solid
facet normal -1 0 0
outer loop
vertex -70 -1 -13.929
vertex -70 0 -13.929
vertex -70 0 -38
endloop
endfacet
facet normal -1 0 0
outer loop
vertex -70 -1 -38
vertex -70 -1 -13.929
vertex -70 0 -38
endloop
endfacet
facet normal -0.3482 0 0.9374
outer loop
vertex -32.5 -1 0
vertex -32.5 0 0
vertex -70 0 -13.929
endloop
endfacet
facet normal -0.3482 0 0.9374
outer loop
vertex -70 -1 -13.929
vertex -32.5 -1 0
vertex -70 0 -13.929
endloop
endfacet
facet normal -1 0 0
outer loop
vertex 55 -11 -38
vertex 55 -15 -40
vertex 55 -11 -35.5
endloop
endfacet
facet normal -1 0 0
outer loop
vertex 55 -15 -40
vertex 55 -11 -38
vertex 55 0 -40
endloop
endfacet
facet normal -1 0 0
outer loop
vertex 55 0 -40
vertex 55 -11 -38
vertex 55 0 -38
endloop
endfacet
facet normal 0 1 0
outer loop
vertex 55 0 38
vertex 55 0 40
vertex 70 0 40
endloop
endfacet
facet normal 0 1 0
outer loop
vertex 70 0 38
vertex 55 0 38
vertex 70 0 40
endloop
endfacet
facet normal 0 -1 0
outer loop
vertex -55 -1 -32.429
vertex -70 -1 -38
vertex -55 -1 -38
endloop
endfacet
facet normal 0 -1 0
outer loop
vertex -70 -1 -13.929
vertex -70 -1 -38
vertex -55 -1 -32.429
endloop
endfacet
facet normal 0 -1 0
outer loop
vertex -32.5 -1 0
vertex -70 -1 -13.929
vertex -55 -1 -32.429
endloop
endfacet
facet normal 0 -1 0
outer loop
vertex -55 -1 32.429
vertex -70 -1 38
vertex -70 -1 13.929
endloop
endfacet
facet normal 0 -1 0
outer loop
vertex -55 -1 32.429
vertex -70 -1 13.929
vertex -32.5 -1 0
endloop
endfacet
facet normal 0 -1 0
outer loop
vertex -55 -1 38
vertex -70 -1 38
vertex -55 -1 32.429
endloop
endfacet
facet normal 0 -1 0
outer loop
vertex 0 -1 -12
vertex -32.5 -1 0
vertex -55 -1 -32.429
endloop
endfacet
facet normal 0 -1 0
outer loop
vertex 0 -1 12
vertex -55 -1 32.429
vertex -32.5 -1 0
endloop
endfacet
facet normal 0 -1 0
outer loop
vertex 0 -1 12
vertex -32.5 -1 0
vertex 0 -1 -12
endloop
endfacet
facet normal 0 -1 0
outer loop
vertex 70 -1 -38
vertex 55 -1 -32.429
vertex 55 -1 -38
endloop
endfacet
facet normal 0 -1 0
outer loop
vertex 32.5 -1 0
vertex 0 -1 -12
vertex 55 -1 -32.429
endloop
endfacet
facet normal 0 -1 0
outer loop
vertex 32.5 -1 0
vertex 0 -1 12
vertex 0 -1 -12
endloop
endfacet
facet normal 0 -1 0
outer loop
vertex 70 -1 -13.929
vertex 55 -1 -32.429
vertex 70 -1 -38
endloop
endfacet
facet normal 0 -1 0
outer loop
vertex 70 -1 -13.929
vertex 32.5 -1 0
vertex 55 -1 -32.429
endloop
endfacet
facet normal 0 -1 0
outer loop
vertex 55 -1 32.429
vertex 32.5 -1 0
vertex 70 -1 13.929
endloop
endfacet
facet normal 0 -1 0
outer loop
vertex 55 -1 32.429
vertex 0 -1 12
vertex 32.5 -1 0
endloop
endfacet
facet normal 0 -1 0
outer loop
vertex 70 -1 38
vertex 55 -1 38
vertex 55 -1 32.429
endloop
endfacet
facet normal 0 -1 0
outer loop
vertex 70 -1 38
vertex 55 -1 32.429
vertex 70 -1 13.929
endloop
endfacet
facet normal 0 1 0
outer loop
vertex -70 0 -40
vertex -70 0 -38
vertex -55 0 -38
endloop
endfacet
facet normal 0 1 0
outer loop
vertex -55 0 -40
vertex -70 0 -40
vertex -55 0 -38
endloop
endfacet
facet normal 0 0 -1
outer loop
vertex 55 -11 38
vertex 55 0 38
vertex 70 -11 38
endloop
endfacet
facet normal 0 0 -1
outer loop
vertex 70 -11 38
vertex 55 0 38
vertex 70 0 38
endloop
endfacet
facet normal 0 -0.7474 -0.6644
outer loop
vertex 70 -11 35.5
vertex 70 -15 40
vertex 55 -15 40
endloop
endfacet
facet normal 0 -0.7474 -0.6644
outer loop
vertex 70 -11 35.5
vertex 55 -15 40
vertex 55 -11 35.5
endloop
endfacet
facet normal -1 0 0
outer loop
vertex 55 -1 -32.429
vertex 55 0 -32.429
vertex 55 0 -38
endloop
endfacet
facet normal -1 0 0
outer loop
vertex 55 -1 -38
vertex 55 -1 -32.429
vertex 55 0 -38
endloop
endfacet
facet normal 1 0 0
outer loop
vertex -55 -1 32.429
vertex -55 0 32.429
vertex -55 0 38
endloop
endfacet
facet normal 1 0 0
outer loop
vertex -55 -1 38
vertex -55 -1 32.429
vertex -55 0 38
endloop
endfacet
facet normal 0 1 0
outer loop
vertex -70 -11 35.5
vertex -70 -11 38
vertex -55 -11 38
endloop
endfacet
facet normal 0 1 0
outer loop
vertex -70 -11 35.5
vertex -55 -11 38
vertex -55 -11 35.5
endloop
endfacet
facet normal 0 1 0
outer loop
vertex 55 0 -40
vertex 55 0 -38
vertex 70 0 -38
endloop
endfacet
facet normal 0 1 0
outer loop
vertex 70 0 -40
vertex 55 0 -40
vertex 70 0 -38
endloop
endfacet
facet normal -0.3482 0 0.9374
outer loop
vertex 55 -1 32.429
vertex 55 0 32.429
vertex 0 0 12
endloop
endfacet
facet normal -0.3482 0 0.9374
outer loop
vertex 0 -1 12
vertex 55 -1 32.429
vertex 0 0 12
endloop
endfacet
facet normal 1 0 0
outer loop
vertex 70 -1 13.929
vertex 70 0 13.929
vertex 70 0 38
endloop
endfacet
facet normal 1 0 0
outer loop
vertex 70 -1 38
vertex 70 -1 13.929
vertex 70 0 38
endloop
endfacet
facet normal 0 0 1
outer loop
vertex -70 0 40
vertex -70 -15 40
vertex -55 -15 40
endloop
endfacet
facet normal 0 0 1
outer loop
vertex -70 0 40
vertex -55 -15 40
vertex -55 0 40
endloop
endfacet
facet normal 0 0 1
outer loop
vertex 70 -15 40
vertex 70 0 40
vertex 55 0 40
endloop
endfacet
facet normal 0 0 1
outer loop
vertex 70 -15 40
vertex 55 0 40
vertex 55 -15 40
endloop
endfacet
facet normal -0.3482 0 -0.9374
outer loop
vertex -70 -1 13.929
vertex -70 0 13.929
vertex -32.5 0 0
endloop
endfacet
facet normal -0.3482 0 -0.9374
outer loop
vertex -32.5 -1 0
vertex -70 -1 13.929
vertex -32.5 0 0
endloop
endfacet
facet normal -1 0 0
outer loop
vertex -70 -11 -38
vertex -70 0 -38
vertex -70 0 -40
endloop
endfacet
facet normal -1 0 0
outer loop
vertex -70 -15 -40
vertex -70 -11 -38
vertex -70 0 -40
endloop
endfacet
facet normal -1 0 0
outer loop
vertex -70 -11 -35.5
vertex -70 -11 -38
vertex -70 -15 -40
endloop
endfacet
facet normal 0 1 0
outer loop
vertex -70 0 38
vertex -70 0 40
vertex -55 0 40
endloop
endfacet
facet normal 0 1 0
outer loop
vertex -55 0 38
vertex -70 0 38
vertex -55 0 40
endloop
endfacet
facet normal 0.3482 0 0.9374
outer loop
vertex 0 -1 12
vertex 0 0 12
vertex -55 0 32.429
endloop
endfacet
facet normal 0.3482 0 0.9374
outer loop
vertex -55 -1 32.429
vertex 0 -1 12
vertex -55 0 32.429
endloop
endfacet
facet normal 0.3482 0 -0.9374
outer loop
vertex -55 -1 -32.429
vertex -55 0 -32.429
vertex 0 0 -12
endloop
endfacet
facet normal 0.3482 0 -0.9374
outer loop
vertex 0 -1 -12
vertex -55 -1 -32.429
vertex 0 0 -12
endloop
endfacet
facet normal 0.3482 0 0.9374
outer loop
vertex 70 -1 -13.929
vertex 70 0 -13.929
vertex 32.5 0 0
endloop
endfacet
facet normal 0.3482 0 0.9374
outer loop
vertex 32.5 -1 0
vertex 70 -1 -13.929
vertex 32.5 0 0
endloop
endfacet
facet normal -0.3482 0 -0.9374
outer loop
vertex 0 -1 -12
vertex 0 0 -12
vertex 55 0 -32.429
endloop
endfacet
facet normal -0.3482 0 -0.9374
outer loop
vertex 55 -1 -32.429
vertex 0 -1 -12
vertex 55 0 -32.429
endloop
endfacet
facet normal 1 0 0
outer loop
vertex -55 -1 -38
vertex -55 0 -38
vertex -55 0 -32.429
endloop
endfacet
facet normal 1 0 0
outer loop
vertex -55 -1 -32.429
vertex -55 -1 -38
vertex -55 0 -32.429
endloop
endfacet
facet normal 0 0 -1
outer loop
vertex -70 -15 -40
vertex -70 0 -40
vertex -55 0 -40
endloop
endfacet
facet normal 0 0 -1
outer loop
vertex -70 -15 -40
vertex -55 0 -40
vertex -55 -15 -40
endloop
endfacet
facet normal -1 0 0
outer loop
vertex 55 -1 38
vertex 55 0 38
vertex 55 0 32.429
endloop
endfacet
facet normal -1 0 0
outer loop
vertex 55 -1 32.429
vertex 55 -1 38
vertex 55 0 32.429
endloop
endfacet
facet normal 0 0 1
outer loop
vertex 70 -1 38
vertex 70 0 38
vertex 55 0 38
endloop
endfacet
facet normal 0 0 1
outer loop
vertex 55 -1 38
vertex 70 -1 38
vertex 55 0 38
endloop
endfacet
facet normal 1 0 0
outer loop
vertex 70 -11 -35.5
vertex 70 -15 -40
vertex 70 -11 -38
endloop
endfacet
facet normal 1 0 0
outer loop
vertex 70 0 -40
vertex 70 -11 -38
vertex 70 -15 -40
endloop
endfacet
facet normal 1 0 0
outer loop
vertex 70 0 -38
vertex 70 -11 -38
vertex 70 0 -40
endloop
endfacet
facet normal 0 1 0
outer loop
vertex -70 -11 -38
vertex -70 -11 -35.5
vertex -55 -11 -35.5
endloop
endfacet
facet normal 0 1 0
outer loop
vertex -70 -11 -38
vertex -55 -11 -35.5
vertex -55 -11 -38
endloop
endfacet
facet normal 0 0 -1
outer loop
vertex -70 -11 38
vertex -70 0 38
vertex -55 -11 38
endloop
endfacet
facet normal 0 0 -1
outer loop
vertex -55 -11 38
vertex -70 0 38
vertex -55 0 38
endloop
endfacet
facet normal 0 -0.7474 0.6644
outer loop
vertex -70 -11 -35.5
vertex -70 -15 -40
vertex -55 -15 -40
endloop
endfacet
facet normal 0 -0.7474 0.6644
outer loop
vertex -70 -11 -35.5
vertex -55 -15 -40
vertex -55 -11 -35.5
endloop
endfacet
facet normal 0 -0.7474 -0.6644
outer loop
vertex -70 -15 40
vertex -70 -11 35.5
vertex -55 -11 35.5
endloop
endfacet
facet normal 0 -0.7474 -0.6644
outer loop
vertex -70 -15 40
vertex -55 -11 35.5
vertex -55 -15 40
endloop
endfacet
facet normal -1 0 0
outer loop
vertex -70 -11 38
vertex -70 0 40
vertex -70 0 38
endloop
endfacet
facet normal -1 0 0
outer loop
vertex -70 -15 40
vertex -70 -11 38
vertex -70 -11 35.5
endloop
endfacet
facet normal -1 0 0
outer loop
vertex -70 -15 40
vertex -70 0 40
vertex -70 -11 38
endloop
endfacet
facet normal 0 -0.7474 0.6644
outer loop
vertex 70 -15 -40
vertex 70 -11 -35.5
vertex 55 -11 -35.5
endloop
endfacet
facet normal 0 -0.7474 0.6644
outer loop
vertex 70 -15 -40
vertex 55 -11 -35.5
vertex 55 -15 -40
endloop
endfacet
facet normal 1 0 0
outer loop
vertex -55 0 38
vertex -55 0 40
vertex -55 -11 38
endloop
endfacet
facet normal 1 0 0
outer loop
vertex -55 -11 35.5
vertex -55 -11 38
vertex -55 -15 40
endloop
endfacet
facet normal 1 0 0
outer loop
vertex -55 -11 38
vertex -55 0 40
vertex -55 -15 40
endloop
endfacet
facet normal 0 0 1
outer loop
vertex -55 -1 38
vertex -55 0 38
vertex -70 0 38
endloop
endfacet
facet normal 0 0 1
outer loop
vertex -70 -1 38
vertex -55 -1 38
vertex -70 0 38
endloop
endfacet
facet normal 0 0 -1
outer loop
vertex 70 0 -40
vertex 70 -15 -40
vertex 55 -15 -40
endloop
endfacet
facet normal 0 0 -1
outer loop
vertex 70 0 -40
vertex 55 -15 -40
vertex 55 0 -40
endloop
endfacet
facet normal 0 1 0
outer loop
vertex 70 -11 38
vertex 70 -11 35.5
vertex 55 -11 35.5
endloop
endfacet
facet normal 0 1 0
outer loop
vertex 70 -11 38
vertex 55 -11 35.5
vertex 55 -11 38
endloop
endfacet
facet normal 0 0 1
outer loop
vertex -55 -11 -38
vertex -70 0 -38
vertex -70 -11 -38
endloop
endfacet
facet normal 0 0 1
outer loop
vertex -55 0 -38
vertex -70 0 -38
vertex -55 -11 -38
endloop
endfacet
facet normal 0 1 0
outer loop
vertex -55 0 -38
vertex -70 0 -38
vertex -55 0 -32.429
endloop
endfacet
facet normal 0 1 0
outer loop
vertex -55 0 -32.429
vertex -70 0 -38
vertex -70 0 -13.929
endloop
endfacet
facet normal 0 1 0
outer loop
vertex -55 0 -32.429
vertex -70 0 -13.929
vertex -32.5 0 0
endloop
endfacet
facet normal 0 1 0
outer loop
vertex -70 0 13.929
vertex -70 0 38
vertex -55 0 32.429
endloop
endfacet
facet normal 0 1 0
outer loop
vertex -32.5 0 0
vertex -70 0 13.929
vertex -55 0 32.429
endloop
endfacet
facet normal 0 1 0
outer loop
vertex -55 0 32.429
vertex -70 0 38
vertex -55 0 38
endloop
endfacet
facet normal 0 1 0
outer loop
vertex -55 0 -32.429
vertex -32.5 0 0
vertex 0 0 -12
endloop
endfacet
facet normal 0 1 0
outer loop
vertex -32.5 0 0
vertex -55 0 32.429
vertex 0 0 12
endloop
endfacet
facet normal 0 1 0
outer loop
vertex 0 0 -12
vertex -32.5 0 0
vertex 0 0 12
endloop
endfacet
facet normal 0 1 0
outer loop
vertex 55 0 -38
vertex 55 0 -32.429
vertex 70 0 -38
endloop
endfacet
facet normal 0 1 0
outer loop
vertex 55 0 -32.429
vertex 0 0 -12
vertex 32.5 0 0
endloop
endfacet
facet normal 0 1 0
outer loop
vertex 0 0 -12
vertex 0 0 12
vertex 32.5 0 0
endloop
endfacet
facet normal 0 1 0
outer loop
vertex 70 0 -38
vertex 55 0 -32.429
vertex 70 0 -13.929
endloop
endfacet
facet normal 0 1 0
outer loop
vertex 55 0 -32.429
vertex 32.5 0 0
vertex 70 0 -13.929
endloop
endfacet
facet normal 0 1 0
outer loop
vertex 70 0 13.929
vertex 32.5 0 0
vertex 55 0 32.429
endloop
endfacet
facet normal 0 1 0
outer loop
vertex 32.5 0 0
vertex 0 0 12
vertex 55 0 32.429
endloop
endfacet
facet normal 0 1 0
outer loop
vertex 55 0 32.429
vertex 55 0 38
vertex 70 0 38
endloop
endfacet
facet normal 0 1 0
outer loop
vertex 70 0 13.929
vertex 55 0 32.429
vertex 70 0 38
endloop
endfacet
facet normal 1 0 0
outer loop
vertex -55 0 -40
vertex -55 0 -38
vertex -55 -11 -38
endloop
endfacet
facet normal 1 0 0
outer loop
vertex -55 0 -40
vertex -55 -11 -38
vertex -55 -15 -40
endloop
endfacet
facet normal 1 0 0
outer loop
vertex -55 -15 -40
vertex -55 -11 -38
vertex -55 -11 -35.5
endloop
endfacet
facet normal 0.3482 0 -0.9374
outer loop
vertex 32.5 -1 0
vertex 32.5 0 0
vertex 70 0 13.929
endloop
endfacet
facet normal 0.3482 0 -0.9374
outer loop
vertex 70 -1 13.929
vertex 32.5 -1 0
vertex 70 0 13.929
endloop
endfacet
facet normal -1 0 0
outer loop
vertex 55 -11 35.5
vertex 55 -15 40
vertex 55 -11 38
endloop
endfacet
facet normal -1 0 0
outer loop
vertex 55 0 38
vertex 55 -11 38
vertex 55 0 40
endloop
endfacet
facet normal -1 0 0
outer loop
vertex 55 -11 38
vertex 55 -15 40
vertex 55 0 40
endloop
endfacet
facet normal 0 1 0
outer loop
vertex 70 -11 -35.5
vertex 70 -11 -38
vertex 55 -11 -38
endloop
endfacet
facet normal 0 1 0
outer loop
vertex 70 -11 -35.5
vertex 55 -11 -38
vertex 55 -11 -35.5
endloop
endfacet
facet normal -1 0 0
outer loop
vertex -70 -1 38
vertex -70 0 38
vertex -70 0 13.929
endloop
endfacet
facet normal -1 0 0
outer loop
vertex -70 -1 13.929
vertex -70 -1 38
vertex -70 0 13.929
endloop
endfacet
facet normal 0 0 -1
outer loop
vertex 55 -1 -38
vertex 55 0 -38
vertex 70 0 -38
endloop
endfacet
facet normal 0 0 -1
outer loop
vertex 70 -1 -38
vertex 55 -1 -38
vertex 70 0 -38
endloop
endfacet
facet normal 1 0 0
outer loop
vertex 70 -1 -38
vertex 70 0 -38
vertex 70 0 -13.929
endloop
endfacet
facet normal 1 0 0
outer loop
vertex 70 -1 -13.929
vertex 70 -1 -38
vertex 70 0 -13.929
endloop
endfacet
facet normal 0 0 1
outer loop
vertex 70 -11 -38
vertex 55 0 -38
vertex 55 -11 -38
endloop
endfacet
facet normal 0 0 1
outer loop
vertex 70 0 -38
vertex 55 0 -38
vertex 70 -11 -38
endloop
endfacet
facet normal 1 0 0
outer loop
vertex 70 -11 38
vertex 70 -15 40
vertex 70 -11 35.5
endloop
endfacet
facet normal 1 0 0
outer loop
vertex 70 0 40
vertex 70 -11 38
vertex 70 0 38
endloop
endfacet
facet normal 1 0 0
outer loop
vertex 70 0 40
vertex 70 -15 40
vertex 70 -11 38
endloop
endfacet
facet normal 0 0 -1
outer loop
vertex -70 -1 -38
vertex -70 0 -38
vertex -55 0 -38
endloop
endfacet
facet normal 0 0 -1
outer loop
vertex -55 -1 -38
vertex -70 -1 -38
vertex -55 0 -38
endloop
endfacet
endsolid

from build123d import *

# Parameters (mm, degrees)
F1_DEPTH  = 1
F0_W      = 15
F0_H      = 2
F2_DEPTH  = 11
F5_DEPTH  = 15
F7_DEPTH  = 15
F9_DEPTH  = 15
F11_DEPTH = 15


# Not quite as in the source:
# - a feature of the source that left no trace in its solid (it failed there, or was rolled back) is left out


with BuildPart() as f1:
    # F0 (on Front) → F1 (new body)
    with BuildSketch(Plane.XZ):
        Polygon((-55, 38), (-70, 38), (-70, 13.9285714286), (-32.5, 0), (-70, -13.9285714286), (-70, -38), (-55, -38), (-55, -32.4285714286), (0, -12), (55, -32.4285714286), (55, -38), (70, -38), (70, -13.9285714286), (32.5, 0), (70, 13.9285714286), (70, 38), (55, 38), (55, 32.4285714286), (0, 12), (-55, 32.4285714286), align=None)
    extrude(amount=F1_DEPTH)


with BuildPart() as f2:
    # F0 (on Front) → F2 (new body)
    with BuildSketch(Plane.XZ):
        with Locations((62.5, 39)):
            Rectangle(F0_W, F0_H)
    extrude(amount=F2_DEPTH)

    # F4 (on face) → F5 (join)
    with BuildSketch(Plane.YZ.offset(70)):
        Polygon((-11, 35.5), (-11, 38), (-11, 40), (-15, 40), align=None)
    extrude(amount=-F5_DEPTH)


with BuildPart() as f2b:
    # F0 (on Front) → F2, piece 2 (new body)
    with BuildSketch(Plane.XZ):
        with Locations((-62.5, 39)):
            Rectangle(F0_W, F0_H)
    extrude(amount=F2_DEPTH)

    # F6 (on face) → F7 (join)
    with BuildSketch(Plane(origin=(-70, 0, 0), x_dir=(0, -1, 0), z_dir=(-1, 0, 0))):
        Polygon((15, 40), (11, 40), (11, 38), (11, 35.5), align=None)
    extrude(amount=-F7_DEPTH)


with BuildPart() as f2c:
    # F0 (on Front) → F2, piece 3 (new body)
    with BuildSketch(Plane.XZ):
        with Locations((-62.5, -39)):
            Rectangle(F0_W, F0_H)
    extrude(amount=F2_DEPTH)

    # F10 (on face) → F11 (join)
    with BuildSketch(Plane(origin=(-70, 0, 0), x_dir=(0, -1, 0), z_dir=(-1, 0, 0))):
        Polygon((11, -35.5), (11, -40), (15, -40), align=None)
    extrude(amount=-F11_DEPTH)


with BuildPart() as f2d:
    # F0 (on Front) → F2, piece 4 (new body)
    with BuildSketch(Plane.XZ):
        with Locations((62.5, -39)):
            Rectangle(F0_W, F0_H)
    extrude(amount=F2_DEPTH)

    # F8 (on face) → F9 (join)
    with BuildSketch(Plane.YZ.offset(70)):
        Polygon((-15, -40), (-11, -40), (-11, -35.5), align=None)
    extrude(amount=-F9_DEPTH)


solid = Compound([f1.part, f2.part, f2b.part, f2c.part, f2d.part])
